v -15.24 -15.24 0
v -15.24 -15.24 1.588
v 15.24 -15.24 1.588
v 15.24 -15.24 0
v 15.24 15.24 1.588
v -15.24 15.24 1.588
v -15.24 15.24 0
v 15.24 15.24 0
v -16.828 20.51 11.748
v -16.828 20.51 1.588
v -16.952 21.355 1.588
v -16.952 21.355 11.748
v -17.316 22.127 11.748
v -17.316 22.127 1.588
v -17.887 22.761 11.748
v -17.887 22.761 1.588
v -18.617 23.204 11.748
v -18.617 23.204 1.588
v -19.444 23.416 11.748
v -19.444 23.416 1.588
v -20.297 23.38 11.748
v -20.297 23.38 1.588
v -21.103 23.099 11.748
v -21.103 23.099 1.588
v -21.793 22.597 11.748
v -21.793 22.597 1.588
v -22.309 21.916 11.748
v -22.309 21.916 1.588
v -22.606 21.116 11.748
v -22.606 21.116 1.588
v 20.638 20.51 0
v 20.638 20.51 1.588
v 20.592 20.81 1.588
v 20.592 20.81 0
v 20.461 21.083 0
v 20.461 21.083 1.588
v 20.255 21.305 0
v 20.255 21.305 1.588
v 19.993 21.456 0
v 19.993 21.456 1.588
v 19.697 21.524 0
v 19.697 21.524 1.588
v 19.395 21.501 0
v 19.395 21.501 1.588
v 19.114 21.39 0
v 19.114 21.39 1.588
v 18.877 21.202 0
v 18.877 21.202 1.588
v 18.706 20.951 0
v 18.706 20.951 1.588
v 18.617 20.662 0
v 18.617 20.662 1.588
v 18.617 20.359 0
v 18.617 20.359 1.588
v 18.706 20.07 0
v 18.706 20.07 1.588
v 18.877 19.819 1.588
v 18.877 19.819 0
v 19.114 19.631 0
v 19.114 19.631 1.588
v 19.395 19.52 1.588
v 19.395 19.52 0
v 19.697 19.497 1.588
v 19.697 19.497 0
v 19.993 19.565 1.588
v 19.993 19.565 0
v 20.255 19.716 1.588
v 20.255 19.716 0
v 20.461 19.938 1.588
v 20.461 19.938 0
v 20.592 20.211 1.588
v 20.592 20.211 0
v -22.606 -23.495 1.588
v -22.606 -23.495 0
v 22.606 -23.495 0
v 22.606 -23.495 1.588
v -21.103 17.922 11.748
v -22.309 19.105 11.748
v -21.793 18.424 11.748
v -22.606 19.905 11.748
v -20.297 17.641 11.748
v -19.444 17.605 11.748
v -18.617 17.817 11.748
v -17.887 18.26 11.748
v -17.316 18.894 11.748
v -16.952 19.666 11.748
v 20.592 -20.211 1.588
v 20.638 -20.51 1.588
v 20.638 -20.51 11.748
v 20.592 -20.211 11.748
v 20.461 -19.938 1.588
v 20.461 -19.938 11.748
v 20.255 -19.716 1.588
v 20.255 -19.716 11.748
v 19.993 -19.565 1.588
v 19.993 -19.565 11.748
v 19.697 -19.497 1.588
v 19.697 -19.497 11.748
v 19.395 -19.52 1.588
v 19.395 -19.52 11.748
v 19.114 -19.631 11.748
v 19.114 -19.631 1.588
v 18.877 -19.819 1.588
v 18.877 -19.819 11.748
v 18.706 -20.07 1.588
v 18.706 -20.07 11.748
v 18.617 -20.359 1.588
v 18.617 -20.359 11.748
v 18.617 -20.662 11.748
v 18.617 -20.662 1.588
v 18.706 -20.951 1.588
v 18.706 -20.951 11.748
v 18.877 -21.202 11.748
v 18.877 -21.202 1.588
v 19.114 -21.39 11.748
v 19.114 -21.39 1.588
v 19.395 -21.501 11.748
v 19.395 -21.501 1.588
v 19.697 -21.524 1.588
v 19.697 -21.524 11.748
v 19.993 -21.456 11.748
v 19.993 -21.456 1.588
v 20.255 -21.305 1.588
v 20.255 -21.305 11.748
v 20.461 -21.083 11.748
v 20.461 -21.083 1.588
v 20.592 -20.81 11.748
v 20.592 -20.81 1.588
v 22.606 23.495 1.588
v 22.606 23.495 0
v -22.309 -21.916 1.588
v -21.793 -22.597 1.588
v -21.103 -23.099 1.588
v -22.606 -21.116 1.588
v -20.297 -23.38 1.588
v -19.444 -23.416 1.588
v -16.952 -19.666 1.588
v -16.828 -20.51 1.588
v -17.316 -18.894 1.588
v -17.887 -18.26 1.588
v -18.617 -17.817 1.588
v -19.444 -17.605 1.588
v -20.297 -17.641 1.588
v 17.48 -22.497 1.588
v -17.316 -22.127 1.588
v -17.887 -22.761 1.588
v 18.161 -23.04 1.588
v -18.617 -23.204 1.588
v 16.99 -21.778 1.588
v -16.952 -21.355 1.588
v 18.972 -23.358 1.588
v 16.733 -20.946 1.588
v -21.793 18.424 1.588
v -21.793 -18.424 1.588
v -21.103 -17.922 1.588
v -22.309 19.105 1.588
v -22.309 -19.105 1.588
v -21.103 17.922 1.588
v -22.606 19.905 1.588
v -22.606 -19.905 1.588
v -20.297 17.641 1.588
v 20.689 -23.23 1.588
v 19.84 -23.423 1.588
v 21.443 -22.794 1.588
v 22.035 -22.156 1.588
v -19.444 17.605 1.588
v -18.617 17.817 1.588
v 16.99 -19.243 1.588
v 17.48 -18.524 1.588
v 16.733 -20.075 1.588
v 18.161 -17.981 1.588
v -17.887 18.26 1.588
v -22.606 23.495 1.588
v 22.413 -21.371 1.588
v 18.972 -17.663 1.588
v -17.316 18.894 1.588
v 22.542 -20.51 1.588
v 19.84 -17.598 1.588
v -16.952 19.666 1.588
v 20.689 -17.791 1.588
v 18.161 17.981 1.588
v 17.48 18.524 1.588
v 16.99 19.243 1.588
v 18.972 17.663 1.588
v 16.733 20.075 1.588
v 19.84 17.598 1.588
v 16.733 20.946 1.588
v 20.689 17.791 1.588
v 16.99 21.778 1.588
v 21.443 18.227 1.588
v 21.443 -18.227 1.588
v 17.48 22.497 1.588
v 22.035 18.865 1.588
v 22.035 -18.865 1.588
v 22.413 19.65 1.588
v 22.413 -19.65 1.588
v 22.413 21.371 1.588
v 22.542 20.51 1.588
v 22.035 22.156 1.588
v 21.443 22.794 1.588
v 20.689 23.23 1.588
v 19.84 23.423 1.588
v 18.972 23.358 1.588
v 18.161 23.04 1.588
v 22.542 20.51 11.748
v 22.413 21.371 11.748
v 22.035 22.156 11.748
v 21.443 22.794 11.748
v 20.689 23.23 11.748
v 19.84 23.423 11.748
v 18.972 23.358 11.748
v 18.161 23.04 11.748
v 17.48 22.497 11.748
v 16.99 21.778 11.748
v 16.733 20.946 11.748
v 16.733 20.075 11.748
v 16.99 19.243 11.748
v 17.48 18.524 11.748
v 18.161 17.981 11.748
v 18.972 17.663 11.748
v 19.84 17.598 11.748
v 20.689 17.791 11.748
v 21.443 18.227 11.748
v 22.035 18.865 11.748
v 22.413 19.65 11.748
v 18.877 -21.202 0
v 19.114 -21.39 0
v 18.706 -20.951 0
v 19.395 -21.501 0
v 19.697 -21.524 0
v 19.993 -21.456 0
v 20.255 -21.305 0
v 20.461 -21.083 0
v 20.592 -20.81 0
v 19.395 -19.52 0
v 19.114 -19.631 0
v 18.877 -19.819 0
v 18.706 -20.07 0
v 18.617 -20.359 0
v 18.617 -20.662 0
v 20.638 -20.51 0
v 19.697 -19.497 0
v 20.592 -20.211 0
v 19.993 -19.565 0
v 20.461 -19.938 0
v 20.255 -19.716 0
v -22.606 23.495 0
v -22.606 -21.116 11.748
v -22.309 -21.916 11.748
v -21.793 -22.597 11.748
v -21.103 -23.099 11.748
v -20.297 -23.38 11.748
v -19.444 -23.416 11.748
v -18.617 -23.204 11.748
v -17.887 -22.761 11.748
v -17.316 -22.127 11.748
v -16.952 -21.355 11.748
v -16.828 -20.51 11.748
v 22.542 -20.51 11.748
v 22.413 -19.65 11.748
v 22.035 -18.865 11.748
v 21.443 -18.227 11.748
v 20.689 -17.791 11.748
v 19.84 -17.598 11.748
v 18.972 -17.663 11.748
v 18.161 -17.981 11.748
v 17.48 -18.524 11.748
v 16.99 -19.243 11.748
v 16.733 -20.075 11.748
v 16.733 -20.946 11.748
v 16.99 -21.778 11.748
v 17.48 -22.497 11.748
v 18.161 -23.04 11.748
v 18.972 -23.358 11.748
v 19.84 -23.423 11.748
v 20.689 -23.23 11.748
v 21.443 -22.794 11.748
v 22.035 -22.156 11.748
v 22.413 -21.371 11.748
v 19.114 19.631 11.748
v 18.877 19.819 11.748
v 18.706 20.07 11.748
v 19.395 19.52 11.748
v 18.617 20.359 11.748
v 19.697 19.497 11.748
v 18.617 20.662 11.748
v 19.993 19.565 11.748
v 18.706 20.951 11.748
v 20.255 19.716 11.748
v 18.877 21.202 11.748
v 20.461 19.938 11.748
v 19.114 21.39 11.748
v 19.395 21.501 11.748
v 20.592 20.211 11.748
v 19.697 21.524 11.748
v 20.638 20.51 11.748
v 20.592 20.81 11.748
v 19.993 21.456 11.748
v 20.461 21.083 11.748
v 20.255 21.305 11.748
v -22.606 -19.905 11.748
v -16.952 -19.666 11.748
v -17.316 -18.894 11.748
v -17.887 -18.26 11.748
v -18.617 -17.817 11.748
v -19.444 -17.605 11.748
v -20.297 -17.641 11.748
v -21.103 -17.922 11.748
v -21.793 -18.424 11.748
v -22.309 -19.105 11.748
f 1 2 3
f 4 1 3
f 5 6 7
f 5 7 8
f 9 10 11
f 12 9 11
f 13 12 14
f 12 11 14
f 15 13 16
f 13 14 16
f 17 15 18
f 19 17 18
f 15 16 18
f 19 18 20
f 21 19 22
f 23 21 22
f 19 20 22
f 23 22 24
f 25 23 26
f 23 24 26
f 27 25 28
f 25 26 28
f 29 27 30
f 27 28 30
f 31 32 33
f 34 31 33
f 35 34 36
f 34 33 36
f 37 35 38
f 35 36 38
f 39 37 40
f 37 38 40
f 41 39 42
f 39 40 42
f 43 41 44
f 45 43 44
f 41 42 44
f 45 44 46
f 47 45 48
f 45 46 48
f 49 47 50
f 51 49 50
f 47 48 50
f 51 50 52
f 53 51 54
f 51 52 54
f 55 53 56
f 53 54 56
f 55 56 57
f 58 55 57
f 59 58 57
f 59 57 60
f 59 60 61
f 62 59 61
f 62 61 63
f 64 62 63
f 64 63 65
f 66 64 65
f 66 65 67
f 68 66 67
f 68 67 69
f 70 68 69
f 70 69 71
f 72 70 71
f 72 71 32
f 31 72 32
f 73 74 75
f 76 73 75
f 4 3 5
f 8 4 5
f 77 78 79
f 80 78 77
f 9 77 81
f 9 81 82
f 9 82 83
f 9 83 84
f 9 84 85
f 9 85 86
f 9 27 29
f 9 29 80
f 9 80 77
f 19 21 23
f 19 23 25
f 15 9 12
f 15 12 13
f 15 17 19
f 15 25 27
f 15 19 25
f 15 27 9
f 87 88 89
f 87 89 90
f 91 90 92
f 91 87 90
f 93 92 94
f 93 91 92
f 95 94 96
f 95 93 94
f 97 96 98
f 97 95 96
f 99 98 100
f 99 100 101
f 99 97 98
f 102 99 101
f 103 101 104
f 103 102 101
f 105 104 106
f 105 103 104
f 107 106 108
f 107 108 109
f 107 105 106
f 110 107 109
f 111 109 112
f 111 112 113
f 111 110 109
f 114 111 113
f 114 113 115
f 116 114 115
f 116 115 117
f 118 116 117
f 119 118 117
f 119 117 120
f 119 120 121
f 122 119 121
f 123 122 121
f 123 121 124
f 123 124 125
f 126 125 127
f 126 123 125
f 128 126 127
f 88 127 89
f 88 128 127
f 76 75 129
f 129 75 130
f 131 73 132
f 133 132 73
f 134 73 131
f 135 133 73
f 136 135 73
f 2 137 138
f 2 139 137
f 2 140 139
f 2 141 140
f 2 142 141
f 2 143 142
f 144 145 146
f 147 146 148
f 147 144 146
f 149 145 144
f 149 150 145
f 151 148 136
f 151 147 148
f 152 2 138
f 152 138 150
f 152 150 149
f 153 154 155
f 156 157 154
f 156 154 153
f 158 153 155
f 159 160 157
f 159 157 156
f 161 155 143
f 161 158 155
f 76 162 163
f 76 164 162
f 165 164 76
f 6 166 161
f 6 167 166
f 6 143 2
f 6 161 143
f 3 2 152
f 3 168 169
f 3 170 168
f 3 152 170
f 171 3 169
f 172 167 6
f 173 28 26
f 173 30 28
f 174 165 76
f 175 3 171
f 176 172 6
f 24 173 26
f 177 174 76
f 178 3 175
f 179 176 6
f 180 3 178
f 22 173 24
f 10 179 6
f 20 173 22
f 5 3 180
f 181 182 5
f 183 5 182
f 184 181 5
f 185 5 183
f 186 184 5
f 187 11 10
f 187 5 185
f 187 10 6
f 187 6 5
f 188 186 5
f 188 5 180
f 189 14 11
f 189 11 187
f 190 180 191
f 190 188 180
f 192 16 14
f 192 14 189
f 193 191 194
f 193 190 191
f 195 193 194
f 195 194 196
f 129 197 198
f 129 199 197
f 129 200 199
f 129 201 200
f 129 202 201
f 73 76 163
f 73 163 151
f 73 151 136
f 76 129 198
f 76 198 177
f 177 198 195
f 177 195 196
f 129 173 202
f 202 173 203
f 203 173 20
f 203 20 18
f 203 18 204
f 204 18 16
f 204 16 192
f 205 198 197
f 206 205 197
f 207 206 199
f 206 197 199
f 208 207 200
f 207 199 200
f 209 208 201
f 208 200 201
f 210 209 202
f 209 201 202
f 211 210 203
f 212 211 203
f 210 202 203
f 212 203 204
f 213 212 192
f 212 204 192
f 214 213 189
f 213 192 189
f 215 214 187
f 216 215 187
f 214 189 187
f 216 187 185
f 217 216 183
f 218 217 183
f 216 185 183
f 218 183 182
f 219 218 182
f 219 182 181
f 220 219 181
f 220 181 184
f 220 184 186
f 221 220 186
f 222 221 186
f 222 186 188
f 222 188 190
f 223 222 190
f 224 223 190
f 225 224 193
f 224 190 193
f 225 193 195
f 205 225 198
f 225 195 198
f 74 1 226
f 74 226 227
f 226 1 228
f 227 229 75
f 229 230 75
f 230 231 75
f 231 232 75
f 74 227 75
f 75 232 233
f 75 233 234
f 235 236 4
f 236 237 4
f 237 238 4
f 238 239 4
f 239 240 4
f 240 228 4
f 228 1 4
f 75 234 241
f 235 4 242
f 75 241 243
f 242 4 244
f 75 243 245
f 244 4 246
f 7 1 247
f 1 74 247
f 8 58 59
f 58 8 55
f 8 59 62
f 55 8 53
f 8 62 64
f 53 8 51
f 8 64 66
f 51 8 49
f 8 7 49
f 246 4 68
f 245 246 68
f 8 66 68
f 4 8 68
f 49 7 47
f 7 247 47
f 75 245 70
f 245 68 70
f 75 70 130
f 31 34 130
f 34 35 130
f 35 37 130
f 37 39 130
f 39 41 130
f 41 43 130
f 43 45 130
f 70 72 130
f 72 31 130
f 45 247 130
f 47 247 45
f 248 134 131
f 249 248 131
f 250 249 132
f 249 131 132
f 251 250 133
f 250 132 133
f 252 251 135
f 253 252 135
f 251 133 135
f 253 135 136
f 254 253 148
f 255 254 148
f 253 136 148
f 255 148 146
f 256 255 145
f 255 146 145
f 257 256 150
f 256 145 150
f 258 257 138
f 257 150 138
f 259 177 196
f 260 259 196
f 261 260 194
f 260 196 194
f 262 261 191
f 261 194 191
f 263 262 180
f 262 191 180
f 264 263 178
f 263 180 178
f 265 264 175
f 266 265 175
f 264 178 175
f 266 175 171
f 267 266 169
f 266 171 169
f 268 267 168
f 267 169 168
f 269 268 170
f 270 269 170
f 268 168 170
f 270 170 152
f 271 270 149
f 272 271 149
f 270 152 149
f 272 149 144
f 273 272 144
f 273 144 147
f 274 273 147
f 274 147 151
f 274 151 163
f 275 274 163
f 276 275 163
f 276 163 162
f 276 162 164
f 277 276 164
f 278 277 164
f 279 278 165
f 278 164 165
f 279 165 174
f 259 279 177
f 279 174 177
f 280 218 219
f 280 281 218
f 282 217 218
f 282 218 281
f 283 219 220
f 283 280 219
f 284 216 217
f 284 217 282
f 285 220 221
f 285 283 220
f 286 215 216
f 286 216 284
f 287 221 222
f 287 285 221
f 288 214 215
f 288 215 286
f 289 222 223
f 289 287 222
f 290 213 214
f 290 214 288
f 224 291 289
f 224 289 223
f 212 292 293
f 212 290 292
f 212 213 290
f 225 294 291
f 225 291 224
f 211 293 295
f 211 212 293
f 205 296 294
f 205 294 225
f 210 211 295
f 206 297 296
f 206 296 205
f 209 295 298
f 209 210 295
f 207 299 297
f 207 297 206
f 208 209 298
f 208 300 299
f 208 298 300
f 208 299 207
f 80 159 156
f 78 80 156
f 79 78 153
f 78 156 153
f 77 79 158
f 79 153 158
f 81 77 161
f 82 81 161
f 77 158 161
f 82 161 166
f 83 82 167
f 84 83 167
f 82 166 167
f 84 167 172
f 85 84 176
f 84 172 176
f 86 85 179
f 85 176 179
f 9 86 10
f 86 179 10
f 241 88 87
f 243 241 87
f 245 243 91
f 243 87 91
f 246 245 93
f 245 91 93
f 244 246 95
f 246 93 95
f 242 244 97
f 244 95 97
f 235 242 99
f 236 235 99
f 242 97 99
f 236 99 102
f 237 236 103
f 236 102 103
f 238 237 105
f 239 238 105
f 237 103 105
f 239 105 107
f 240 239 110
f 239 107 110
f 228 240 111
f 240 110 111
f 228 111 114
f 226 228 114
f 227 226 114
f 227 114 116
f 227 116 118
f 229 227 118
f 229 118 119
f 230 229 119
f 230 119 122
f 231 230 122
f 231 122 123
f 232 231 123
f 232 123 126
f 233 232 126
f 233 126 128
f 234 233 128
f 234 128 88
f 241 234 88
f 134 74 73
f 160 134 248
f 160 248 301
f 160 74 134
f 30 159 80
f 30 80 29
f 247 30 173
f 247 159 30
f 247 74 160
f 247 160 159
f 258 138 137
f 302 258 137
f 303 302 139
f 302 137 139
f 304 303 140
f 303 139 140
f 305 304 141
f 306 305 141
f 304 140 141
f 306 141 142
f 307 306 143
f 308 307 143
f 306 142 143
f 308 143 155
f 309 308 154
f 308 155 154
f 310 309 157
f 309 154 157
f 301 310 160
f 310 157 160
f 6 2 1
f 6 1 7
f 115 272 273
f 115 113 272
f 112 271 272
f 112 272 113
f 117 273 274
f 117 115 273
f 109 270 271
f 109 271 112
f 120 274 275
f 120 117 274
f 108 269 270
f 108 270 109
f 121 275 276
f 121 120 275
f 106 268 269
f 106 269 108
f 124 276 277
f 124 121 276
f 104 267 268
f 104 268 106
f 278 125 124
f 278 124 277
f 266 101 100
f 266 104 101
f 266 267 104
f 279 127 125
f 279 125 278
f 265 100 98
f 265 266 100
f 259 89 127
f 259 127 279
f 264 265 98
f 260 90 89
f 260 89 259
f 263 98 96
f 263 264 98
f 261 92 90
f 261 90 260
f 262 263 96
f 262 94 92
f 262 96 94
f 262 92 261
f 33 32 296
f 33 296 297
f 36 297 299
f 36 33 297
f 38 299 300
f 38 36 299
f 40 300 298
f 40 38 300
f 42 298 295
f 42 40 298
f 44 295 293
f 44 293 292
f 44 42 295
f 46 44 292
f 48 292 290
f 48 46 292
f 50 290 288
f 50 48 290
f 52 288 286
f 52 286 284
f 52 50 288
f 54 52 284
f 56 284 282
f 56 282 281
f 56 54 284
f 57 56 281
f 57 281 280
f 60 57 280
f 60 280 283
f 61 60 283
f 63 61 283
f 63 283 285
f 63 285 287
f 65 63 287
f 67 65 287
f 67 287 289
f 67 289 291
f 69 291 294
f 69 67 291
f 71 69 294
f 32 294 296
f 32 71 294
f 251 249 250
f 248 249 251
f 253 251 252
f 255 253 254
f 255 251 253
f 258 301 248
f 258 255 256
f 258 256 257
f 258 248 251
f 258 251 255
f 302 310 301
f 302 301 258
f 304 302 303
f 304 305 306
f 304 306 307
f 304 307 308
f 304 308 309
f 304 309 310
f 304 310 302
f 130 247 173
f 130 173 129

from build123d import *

# Parameters (mm, degrees)
F0_W     = 45.212
F0_H     = 46.99
F1_DEPTH = 1.5875
F2_W     = 30.48
F2_H     = 30.48
F3_DEPTH = 6.35
F4_R     = 2.921
F4_R_2   = 1.016
F5_DEPTH = 10.16
F6_DEPTH = 6.35


with BuildPart() as f1:
    # F0 (on Top) → F1 (new body)
    with BuildSketch(Plane.XY):
        Rectangle(F0_W, F0_H)
    extrude(amount=F1_DEPTH)

    # F2 (on face) → F3 (cut)
    with BuildSketch(Plane.XY.offset(1.5875)):
        Rectangle(F2_W, F2_H)
    extrude(amount=-F3_DEPTH, mode=Mode.SUBTRACT)

    # F4 (on face) → F5 (join)
    with BuildSketch(Plane.XY.offset(1.5875)):
        with Locations((19.6215, -20.5105)):
            Circle(F4_R)
        with Locations((19.6215, -20.5105)):
            Circle(F4_R_2, mode=Mode.SUBTRACT)
        with BuildLine():
            ThreePointArc((-22.606, 19.9047486071), (-19.4439646983, 17.6054183746), (-16.8275, 20.5105))
            ThreePointArc((-16.8275, 20.5105), (-19.4439646983, 23.4155816254), (-22.606, 21.1162513929))
            Line((-22.606, 21.1162513929), (-22.606, 19.9047486071))
        make_face()
        with BuildLine():
            ThreePointArc((-16.8275, -20.5105), (-19.4439646983, -17.6054183746), (-22.606, -19.9047486071))
            Line((-22.606, -19.9047486071), (-22.606, -21.1162513929))
            ThreePointArc((-22.606, -21.1162513929), (-19.4439646983, -23.4155816254), (-16.8275, -20.5105))
        make_face()
        with Locations((19.6215, 20.5105)):
            Circle(F4_R)
        with Locations((19.6215, 20.5105)):
            Circle(F4_R_2, mode=Mode.SUBTRACT)
    extrude(amount=F5_DEPTH)

    # F4 (on face) → F6 (cut)
    with BuildSketch(Plane.XY.offset(1.5875)):
        with Locations((19.6215, -20.5105)):
            Circle(F4_R_2)
        with Locations((19.6215, 20.5105)):
            Circle(F4_R_2)
    extrude(amount=-F6_DEPTH, mode=Mode.SUBTRACT)


solid = f1.part
